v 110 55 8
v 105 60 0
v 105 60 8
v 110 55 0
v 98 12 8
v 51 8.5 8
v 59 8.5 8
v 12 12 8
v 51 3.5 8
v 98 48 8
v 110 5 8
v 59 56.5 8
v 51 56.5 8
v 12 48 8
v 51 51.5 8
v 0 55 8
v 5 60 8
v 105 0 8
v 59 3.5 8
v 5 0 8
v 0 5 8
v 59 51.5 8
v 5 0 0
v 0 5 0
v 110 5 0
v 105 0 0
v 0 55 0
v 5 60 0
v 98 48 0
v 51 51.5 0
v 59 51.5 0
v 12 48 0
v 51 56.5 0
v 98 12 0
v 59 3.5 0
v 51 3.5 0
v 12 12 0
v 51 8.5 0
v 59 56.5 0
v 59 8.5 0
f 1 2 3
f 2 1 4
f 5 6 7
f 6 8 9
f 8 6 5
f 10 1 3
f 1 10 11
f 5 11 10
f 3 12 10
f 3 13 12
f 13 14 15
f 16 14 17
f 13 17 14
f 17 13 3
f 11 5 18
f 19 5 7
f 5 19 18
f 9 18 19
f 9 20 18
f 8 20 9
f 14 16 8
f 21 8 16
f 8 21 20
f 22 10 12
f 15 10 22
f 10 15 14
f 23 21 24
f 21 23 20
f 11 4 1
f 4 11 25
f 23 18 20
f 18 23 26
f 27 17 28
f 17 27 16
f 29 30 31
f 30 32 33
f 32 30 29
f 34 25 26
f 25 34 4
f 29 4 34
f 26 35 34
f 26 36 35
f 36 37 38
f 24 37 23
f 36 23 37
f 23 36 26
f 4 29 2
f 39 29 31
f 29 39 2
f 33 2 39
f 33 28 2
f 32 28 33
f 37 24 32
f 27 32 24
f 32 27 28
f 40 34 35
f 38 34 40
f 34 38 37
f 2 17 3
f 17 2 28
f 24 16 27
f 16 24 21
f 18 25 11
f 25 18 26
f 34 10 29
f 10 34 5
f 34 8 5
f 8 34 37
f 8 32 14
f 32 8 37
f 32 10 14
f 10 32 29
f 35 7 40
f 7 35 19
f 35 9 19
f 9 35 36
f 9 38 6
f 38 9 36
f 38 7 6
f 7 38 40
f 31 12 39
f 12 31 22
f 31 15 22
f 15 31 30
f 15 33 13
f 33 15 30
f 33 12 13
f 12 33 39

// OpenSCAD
$fn = 32;

// ----------------------------------------------------------------------
// Frame plate: 110 x 60 frame, 12 mm rails
// ----------------------------------------------------------------------

// --- parameters (mm) ---
plate_l = 110;            // plate length, X
plate_w = 60;             // plate width, Y
plate_t = 8;              // plate thickness, Z (extrusion height)
corner_c = 5;             // corner chamfer
frame_bar = 12;           // frame rail width
slot_l = 8;               // adjustment slot length
slot_w = 5;               // adjustment slot width

win_l = plate_l - 2 * frame_bar;  // window length
win_w = plate_w - 2 * frame_bar;  // window width

profile = [[5, 0], [105, 0], [110, 5], [110, 55], [105, 60], [5, 60], [0, 55], [0, 5]];  // primary outline, 8 points, counter clockwise
void_1 = [[12, 12], [98, 12], [98, 48], [12, 48]];  // the window, 4 points
void_2 = [[51, 3.5], [59, 3.5], [59, 8.5], [51, 8.5]];  // adjustment slot, 4 points
void_3 = [[51, 51.5], [59, 51.5], [59, 56.5], [51, 56.5]];  // adjustment slot, 4 points

// --- the one profile operation ---
difference() {
  linear_extrude(height = plate_t) polygon(points = profile);
  translate([0, 0, -1])
    linear_extrude(height = plate_t + 2) polygon(points = void_1);
  translate([0, 0, -1])
    linear_extrude(height = plate_t + 2) polygon(points = void_2);
  translate([0, 0, -1])
    linear_extrude(height = plate_t + 2) polygon(points = void_3);
}
